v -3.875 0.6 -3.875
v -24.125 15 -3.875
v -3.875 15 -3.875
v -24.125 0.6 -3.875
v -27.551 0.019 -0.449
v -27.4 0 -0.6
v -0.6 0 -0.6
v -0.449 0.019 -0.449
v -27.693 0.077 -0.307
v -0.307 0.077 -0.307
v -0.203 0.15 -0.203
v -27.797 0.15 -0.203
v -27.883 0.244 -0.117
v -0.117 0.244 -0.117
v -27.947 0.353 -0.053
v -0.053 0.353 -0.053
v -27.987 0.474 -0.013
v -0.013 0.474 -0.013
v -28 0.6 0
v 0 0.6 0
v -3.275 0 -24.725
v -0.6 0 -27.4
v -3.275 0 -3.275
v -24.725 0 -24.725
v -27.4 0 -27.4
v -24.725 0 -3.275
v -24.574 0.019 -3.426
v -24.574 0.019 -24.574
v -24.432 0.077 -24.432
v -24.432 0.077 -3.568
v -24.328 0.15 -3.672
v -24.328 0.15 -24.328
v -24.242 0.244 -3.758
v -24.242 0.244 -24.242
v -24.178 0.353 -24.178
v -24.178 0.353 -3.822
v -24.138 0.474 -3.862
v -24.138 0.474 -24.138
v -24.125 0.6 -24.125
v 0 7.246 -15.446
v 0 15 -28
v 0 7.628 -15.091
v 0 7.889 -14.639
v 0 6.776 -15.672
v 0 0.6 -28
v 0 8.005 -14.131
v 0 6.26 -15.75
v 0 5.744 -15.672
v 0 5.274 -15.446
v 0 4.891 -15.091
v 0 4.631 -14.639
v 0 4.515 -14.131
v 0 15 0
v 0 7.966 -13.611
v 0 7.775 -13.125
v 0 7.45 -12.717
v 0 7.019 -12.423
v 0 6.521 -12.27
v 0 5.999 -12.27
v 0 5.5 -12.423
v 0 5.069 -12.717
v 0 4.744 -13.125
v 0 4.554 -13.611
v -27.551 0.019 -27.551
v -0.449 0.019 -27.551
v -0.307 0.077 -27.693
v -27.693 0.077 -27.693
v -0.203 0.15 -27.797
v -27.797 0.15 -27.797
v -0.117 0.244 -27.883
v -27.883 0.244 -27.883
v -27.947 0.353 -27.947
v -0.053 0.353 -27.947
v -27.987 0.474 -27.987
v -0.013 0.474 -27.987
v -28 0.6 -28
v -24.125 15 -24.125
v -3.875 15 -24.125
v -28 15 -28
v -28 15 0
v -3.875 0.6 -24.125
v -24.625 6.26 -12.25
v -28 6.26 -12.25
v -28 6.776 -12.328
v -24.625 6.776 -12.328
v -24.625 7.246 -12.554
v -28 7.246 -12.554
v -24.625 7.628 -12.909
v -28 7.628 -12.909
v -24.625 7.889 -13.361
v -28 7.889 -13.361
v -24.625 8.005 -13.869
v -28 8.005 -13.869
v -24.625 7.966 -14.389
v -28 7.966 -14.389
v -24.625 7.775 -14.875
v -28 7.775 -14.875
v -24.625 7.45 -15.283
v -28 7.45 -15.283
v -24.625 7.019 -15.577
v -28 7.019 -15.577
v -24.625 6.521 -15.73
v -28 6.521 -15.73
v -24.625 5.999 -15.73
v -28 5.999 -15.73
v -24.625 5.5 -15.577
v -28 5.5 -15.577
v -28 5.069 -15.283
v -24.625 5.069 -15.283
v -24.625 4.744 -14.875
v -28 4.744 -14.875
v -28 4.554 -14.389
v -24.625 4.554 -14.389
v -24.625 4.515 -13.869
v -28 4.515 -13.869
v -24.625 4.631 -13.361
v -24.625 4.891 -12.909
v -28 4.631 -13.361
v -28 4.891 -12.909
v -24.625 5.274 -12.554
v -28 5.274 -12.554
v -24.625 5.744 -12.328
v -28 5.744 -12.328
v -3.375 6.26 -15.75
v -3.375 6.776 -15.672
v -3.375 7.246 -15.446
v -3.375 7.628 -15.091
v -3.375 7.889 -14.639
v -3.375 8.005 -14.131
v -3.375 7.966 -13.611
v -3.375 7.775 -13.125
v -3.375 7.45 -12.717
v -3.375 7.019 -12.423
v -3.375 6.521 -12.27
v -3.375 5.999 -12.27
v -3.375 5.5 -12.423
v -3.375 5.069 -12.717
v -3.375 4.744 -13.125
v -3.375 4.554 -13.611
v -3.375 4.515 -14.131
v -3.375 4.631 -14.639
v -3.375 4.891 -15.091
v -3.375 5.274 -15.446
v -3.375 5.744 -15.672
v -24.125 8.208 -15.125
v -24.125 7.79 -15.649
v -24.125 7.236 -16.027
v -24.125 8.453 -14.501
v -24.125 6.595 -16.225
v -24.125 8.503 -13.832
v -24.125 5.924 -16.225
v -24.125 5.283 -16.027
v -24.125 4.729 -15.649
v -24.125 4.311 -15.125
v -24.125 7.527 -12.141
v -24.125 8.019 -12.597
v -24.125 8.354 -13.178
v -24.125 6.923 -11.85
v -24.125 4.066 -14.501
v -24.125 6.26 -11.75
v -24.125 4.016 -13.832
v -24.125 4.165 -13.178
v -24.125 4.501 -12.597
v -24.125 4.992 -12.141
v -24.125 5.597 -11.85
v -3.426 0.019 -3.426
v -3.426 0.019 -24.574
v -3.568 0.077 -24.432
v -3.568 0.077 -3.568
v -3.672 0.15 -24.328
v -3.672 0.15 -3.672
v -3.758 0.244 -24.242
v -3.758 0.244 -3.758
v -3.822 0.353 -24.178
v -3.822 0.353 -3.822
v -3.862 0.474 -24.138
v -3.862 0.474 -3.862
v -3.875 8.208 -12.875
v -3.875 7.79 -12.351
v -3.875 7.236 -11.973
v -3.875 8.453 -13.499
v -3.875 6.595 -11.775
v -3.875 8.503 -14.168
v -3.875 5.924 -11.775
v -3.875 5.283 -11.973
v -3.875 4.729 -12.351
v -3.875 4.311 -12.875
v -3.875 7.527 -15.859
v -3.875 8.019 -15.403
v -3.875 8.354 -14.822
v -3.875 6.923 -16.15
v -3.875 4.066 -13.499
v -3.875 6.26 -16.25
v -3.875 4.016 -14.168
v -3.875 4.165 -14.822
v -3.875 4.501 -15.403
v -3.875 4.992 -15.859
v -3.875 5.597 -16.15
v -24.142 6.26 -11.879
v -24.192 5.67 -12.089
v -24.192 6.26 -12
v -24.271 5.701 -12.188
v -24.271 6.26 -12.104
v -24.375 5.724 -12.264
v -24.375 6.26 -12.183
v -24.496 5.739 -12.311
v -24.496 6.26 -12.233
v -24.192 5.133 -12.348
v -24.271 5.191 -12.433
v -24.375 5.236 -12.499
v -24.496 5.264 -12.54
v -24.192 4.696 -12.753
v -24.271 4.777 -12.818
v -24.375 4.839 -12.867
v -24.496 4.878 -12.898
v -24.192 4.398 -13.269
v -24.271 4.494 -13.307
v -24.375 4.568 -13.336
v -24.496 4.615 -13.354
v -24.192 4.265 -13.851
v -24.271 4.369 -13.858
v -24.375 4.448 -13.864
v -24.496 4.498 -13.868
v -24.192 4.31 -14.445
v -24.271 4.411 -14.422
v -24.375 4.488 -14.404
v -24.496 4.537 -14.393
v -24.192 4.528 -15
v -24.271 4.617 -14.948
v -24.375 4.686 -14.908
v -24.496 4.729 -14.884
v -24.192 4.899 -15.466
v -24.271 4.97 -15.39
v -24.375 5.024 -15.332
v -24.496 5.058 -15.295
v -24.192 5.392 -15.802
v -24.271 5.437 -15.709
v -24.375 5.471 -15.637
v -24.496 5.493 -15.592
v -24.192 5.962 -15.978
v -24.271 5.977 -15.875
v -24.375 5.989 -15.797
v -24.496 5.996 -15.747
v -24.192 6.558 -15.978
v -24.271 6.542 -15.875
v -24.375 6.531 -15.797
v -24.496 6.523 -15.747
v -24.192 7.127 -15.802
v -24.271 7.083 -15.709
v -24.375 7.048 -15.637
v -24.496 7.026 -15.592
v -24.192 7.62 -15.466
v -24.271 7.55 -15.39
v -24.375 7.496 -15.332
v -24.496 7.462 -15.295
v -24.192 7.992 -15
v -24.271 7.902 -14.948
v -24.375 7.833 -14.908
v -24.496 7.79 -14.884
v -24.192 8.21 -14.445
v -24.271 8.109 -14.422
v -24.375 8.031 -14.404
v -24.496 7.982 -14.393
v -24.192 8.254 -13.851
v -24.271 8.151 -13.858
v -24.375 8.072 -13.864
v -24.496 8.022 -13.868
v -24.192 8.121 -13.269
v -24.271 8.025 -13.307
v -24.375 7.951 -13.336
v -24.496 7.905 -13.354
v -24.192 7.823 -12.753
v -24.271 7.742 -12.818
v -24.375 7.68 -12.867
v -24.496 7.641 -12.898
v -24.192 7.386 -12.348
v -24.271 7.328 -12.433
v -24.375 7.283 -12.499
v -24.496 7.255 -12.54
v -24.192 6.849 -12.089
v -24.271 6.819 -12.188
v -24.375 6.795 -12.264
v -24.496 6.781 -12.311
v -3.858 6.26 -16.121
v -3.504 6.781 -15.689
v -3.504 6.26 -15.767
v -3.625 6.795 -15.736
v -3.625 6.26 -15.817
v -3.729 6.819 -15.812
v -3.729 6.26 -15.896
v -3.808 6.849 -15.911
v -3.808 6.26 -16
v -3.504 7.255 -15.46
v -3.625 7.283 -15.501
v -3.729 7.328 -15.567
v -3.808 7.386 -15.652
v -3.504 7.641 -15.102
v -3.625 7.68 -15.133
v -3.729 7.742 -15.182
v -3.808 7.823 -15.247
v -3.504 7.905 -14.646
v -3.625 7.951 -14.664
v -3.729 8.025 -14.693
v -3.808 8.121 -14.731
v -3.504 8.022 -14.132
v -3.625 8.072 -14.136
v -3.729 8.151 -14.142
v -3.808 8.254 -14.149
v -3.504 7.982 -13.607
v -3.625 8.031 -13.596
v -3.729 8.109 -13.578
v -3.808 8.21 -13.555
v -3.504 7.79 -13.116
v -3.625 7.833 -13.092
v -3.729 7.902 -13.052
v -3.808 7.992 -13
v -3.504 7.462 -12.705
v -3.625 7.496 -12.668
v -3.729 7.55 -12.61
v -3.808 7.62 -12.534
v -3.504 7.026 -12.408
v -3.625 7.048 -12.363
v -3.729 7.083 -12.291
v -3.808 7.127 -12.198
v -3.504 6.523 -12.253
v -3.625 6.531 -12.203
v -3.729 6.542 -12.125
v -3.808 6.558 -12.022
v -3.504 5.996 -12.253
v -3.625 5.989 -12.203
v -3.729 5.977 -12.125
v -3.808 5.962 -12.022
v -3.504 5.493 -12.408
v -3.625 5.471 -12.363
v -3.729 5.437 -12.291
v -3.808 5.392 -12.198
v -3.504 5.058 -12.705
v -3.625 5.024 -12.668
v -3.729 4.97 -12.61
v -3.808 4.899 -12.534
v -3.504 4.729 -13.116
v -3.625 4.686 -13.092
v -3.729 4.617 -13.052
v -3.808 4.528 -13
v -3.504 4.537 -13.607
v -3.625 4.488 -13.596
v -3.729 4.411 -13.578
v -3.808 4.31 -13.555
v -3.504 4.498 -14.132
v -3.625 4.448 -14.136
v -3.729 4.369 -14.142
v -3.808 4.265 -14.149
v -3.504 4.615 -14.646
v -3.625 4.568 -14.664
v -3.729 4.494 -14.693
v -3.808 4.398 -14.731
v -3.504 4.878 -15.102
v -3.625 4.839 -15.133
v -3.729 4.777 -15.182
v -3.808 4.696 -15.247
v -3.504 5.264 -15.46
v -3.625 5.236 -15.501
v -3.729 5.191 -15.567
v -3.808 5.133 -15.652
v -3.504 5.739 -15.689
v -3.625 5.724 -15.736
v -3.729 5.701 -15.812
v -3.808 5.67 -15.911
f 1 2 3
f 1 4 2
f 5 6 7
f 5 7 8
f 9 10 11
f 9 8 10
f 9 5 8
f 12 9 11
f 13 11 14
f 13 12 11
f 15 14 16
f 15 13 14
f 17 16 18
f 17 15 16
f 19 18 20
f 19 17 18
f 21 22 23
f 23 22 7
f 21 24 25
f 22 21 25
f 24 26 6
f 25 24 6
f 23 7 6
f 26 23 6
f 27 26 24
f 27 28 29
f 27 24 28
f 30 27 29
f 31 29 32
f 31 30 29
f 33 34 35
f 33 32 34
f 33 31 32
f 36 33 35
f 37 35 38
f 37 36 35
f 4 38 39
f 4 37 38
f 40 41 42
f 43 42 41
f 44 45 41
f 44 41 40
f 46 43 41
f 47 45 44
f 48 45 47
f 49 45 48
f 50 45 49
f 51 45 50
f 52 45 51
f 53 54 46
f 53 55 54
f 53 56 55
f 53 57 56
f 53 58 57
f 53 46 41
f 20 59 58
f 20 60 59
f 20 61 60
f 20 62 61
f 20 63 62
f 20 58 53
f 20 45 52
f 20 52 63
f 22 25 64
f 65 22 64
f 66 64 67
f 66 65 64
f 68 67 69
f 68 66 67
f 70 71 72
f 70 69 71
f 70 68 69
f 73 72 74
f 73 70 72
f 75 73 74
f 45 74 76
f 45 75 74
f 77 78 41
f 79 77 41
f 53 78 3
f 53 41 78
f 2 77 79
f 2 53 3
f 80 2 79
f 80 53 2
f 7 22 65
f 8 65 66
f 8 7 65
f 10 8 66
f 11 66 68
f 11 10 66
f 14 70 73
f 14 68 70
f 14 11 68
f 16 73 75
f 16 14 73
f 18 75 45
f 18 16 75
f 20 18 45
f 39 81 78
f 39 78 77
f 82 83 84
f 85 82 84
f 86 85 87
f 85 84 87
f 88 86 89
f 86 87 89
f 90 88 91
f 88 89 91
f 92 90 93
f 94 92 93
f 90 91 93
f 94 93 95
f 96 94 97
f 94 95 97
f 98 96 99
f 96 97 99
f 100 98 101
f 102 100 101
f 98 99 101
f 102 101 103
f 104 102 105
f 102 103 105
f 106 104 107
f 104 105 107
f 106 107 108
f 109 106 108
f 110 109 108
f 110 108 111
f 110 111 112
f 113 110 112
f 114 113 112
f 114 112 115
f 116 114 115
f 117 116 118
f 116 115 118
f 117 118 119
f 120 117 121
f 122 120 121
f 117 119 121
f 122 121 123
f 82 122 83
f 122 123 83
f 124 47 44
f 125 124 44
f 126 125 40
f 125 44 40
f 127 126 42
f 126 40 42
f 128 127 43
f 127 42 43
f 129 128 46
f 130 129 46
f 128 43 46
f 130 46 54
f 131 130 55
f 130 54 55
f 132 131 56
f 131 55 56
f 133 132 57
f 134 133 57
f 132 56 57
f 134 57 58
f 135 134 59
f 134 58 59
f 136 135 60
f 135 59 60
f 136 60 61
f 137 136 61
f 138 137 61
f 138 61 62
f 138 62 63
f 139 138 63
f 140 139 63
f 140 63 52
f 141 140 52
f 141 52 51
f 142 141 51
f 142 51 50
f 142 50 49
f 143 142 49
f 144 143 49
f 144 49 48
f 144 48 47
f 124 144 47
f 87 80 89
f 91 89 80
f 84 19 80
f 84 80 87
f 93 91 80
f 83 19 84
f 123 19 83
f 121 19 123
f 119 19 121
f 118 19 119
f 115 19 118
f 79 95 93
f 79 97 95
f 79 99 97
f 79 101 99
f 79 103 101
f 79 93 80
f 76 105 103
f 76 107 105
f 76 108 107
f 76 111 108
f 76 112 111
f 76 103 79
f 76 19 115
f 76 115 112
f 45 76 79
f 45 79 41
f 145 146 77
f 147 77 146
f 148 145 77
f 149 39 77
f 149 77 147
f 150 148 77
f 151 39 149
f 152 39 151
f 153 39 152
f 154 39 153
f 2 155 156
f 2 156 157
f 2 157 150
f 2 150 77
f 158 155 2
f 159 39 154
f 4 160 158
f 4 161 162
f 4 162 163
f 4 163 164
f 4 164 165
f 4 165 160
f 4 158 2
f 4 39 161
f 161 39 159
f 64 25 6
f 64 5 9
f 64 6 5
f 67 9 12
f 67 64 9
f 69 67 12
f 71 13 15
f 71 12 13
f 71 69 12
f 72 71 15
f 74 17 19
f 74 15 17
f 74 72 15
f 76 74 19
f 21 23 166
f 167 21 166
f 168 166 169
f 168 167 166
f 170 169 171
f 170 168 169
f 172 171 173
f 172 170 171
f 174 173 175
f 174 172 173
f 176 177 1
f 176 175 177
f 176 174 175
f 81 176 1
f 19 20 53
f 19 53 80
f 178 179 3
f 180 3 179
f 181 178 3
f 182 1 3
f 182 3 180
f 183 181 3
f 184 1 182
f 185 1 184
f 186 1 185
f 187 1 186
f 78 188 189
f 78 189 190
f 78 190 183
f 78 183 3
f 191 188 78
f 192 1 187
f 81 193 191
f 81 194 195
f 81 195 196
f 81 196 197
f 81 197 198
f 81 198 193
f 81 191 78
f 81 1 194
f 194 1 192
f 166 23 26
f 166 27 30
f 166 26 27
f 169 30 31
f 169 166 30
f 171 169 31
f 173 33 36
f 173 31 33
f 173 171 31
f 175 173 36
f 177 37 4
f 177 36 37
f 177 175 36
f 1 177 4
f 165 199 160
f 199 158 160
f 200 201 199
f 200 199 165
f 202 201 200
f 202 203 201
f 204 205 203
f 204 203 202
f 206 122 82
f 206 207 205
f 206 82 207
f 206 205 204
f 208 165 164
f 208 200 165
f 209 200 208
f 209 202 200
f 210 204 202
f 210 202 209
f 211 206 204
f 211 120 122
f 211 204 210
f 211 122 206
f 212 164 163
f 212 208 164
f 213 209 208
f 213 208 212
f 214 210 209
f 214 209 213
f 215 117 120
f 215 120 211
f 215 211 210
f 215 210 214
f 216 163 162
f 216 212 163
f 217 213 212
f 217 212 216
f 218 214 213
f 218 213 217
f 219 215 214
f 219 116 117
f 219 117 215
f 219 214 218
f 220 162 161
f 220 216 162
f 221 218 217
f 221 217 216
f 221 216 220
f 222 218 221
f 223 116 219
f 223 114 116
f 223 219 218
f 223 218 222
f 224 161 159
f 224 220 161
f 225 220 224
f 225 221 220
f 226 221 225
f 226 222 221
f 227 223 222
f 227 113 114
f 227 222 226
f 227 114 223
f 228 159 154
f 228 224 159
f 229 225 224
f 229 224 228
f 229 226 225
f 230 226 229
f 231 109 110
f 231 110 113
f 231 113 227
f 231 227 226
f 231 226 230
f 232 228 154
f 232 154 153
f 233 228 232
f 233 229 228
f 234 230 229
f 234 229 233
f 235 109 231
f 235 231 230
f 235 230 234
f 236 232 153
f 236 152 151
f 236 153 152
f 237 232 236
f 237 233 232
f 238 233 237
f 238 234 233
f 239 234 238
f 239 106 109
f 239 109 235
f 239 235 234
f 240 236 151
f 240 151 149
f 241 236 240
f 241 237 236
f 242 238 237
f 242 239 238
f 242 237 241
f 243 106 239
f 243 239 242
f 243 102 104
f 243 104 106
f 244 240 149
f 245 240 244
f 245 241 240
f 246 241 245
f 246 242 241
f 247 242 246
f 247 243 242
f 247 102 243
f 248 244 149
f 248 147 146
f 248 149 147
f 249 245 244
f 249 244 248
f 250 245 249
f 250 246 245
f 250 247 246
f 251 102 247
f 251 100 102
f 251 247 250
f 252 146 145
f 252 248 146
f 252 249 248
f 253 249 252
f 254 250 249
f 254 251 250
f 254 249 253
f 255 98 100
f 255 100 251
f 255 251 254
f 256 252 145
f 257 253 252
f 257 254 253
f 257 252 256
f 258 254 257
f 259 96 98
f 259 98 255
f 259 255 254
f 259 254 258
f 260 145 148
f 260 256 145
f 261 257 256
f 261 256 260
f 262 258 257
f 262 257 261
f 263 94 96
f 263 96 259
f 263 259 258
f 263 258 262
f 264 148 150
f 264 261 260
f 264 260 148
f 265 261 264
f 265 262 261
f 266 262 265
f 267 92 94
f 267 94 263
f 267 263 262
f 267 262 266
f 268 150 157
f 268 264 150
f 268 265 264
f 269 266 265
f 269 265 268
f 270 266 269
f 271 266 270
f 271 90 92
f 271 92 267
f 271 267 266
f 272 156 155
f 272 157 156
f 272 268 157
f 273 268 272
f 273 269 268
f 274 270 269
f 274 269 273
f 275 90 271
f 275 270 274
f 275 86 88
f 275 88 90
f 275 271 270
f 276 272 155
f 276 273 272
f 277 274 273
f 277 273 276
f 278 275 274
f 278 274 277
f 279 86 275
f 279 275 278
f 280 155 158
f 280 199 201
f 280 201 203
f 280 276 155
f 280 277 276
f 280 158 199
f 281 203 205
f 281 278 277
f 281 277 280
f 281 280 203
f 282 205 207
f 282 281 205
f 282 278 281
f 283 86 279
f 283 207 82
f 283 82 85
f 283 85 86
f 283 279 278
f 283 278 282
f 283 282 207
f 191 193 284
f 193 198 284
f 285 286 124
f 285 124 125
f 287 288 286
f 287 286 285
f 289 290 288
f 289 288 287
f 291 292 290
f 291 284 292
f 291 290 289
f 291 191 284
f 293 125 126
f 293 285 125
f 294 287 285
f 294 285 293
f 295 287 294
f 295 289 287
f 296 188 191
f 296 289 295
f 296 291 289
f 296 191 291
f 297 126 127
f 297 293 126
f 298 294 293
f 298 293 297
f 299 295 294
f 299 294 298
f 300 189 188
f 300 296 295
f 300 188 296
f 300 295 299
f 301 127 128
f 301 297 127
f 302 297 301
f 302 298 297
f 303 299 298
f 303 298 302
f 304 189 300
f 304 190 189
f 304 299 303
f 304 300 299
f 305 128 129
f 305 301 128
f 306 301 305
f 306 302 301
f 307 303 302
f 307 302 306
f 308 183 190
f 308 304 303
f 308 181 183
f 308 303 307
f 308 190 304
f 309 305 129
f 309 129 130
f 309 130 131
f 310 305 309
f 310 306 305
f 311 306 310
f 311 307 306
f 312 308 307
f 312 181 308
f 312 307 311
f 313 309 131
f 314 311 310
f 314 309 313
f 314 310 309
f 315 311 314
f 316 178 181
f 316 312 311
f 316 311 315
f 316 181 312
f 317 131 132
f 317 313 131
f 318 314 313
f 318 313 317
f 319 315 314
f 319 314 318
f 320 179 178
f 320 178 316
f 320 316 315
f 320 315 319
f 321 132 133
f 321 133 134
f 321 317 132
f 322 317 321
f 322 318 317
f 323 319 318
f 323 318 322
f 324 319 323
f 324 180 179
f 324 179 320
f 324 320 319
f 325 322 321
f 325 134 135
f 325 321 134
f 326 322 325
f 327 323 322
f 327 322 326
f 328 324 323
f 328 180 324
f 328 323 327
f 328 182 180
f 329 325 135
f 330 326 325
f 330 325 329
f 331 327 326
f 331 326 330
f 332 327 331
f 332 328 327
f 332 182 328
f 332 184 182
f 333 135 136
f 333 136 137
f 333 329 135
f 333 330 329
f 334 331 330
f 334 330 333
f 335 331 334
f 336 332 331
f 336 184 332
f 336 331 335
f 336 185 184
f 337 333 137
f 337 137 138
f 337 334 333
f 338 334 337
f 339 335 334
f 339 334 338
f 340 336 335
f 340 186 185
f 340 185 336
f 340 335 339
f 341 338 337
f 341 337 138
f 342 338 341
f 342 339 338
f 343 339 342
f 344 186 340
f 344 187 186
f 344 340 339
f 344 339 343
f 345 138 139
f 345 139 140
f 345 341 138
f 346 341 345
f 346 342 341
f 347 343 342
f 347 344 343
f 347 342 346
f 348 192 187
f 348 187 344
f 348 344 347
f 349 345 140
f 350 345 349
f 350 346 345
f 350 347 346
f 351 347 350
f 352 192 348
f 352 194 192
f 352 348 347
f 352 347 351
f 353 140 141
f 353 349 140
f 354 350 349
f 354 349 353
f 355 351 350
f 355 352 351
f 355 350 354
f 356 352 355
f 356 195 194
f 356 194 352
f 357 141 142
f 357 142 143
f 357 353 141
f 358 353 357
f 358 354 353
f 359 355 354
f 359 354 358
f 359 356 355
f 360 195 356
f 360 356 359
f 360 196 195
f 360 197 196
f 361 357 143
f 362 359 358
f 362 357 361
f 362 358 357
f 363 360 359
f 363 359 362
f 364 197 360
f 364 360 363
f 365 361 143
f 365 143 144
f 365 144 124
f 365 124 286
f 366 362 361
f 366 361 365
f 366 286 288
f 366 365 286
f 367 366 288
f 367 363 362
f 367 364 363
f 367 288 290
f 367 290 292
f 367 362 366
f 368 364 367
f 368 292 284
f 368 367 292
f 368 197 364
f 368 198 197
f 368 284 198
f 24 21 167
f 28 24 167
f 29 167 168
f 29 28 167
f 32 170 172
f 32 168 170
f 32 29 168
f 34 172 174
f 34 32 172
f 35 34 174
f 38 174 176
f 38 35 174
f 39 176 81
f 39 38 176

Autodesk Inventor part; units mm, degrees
ref_plane "YZ Plane" through (0, 0, 0) normal (1, 0, 0) x (0, 1, 0)
ref_plane "XZ Plane" through (0, 0, 0) normal (0, 1, 0) x (-1, 0, 0)
ref_plane "XY Plane" through (0, 0, 0) normal (0, 0, 1) x (1, 0, 0)
sketch "Sketch1" plane through (0, 0, 0) normal (0, 1, 0) x (-1, 0, 0)
  line L0 (0, 0) -> (28, 0)
  line L1 (28, 0) -> (28, -28)
  line L2 (28, -28) -> (0, -28)
  line L3 (0, -28) -> (0, 0)
  line L4 (24.125, -3.875) -> (3.875, -3.875)
  line L5 (3.875, -3.875) -> (3.875, -24.125)
  line L6 (3.875, -24.125) -> (24.125, -24.125)
  line L7 (24.125, -24.125) -> (24.125, -3.875)
  line L8 (24.125, -3.875) -> (3.875, -24.125) construction
  line L9 (3.875, -3.875) -> (24.125, -24.125) construction
  line L10 (0, 0) -> (28, -28) construction
  line L11 (28, 0) -> (0, -28) construction
  point P0 (14, -14)
  dimension "d0" = 28
  dimension "d1" = 28
  dimension "d2" = 20.25
  dimension "d3" = 20.25
extrude "Extrusion1" add sketch "Sketch1" along normal blind 15
fillet "Fillet1" radius 0.6 8 edges at (-14, 0, -3.875) (-24.125, 0, -14) (-14, 0, -24.125) (-3.875, 0, -14) (-14, 0, 0) (-28, 0, -14) (-14, 0, -28) (0, 0, -14)
sketch "Sketch2" plane through (-28, 15, -28) normal (-1, 0, 0) x (0, 0, 1)
  circle A0 centre (14, -8.7403) radius 1.75
  point P0 (28, -15)
  dimension "d7" = 3.5
extrude "Extrusion2" cut sketch "Sketch2" against normal blind 10
sketch "Sketch3" plane through (0, 15, 0) normal (1, 0, 0) x (0, 0, -1)
  circle A0 centre (14, -8.7403) radius 1.75 projected
  circle A1 centre (14, -8.7403) radius 1.75
  point P0 (0, -15)
  dimension "d10" = 3.5
extrude "Extrusion3" cut sketch "Sketch3" against normal blind 10
fillet "Fillet2" radius 0.5 2 edges at (-3.875, 6.2597, -12.25) (-24.125, 6.2597, -15.75)
properties part number "TestSujetaPerfil"
